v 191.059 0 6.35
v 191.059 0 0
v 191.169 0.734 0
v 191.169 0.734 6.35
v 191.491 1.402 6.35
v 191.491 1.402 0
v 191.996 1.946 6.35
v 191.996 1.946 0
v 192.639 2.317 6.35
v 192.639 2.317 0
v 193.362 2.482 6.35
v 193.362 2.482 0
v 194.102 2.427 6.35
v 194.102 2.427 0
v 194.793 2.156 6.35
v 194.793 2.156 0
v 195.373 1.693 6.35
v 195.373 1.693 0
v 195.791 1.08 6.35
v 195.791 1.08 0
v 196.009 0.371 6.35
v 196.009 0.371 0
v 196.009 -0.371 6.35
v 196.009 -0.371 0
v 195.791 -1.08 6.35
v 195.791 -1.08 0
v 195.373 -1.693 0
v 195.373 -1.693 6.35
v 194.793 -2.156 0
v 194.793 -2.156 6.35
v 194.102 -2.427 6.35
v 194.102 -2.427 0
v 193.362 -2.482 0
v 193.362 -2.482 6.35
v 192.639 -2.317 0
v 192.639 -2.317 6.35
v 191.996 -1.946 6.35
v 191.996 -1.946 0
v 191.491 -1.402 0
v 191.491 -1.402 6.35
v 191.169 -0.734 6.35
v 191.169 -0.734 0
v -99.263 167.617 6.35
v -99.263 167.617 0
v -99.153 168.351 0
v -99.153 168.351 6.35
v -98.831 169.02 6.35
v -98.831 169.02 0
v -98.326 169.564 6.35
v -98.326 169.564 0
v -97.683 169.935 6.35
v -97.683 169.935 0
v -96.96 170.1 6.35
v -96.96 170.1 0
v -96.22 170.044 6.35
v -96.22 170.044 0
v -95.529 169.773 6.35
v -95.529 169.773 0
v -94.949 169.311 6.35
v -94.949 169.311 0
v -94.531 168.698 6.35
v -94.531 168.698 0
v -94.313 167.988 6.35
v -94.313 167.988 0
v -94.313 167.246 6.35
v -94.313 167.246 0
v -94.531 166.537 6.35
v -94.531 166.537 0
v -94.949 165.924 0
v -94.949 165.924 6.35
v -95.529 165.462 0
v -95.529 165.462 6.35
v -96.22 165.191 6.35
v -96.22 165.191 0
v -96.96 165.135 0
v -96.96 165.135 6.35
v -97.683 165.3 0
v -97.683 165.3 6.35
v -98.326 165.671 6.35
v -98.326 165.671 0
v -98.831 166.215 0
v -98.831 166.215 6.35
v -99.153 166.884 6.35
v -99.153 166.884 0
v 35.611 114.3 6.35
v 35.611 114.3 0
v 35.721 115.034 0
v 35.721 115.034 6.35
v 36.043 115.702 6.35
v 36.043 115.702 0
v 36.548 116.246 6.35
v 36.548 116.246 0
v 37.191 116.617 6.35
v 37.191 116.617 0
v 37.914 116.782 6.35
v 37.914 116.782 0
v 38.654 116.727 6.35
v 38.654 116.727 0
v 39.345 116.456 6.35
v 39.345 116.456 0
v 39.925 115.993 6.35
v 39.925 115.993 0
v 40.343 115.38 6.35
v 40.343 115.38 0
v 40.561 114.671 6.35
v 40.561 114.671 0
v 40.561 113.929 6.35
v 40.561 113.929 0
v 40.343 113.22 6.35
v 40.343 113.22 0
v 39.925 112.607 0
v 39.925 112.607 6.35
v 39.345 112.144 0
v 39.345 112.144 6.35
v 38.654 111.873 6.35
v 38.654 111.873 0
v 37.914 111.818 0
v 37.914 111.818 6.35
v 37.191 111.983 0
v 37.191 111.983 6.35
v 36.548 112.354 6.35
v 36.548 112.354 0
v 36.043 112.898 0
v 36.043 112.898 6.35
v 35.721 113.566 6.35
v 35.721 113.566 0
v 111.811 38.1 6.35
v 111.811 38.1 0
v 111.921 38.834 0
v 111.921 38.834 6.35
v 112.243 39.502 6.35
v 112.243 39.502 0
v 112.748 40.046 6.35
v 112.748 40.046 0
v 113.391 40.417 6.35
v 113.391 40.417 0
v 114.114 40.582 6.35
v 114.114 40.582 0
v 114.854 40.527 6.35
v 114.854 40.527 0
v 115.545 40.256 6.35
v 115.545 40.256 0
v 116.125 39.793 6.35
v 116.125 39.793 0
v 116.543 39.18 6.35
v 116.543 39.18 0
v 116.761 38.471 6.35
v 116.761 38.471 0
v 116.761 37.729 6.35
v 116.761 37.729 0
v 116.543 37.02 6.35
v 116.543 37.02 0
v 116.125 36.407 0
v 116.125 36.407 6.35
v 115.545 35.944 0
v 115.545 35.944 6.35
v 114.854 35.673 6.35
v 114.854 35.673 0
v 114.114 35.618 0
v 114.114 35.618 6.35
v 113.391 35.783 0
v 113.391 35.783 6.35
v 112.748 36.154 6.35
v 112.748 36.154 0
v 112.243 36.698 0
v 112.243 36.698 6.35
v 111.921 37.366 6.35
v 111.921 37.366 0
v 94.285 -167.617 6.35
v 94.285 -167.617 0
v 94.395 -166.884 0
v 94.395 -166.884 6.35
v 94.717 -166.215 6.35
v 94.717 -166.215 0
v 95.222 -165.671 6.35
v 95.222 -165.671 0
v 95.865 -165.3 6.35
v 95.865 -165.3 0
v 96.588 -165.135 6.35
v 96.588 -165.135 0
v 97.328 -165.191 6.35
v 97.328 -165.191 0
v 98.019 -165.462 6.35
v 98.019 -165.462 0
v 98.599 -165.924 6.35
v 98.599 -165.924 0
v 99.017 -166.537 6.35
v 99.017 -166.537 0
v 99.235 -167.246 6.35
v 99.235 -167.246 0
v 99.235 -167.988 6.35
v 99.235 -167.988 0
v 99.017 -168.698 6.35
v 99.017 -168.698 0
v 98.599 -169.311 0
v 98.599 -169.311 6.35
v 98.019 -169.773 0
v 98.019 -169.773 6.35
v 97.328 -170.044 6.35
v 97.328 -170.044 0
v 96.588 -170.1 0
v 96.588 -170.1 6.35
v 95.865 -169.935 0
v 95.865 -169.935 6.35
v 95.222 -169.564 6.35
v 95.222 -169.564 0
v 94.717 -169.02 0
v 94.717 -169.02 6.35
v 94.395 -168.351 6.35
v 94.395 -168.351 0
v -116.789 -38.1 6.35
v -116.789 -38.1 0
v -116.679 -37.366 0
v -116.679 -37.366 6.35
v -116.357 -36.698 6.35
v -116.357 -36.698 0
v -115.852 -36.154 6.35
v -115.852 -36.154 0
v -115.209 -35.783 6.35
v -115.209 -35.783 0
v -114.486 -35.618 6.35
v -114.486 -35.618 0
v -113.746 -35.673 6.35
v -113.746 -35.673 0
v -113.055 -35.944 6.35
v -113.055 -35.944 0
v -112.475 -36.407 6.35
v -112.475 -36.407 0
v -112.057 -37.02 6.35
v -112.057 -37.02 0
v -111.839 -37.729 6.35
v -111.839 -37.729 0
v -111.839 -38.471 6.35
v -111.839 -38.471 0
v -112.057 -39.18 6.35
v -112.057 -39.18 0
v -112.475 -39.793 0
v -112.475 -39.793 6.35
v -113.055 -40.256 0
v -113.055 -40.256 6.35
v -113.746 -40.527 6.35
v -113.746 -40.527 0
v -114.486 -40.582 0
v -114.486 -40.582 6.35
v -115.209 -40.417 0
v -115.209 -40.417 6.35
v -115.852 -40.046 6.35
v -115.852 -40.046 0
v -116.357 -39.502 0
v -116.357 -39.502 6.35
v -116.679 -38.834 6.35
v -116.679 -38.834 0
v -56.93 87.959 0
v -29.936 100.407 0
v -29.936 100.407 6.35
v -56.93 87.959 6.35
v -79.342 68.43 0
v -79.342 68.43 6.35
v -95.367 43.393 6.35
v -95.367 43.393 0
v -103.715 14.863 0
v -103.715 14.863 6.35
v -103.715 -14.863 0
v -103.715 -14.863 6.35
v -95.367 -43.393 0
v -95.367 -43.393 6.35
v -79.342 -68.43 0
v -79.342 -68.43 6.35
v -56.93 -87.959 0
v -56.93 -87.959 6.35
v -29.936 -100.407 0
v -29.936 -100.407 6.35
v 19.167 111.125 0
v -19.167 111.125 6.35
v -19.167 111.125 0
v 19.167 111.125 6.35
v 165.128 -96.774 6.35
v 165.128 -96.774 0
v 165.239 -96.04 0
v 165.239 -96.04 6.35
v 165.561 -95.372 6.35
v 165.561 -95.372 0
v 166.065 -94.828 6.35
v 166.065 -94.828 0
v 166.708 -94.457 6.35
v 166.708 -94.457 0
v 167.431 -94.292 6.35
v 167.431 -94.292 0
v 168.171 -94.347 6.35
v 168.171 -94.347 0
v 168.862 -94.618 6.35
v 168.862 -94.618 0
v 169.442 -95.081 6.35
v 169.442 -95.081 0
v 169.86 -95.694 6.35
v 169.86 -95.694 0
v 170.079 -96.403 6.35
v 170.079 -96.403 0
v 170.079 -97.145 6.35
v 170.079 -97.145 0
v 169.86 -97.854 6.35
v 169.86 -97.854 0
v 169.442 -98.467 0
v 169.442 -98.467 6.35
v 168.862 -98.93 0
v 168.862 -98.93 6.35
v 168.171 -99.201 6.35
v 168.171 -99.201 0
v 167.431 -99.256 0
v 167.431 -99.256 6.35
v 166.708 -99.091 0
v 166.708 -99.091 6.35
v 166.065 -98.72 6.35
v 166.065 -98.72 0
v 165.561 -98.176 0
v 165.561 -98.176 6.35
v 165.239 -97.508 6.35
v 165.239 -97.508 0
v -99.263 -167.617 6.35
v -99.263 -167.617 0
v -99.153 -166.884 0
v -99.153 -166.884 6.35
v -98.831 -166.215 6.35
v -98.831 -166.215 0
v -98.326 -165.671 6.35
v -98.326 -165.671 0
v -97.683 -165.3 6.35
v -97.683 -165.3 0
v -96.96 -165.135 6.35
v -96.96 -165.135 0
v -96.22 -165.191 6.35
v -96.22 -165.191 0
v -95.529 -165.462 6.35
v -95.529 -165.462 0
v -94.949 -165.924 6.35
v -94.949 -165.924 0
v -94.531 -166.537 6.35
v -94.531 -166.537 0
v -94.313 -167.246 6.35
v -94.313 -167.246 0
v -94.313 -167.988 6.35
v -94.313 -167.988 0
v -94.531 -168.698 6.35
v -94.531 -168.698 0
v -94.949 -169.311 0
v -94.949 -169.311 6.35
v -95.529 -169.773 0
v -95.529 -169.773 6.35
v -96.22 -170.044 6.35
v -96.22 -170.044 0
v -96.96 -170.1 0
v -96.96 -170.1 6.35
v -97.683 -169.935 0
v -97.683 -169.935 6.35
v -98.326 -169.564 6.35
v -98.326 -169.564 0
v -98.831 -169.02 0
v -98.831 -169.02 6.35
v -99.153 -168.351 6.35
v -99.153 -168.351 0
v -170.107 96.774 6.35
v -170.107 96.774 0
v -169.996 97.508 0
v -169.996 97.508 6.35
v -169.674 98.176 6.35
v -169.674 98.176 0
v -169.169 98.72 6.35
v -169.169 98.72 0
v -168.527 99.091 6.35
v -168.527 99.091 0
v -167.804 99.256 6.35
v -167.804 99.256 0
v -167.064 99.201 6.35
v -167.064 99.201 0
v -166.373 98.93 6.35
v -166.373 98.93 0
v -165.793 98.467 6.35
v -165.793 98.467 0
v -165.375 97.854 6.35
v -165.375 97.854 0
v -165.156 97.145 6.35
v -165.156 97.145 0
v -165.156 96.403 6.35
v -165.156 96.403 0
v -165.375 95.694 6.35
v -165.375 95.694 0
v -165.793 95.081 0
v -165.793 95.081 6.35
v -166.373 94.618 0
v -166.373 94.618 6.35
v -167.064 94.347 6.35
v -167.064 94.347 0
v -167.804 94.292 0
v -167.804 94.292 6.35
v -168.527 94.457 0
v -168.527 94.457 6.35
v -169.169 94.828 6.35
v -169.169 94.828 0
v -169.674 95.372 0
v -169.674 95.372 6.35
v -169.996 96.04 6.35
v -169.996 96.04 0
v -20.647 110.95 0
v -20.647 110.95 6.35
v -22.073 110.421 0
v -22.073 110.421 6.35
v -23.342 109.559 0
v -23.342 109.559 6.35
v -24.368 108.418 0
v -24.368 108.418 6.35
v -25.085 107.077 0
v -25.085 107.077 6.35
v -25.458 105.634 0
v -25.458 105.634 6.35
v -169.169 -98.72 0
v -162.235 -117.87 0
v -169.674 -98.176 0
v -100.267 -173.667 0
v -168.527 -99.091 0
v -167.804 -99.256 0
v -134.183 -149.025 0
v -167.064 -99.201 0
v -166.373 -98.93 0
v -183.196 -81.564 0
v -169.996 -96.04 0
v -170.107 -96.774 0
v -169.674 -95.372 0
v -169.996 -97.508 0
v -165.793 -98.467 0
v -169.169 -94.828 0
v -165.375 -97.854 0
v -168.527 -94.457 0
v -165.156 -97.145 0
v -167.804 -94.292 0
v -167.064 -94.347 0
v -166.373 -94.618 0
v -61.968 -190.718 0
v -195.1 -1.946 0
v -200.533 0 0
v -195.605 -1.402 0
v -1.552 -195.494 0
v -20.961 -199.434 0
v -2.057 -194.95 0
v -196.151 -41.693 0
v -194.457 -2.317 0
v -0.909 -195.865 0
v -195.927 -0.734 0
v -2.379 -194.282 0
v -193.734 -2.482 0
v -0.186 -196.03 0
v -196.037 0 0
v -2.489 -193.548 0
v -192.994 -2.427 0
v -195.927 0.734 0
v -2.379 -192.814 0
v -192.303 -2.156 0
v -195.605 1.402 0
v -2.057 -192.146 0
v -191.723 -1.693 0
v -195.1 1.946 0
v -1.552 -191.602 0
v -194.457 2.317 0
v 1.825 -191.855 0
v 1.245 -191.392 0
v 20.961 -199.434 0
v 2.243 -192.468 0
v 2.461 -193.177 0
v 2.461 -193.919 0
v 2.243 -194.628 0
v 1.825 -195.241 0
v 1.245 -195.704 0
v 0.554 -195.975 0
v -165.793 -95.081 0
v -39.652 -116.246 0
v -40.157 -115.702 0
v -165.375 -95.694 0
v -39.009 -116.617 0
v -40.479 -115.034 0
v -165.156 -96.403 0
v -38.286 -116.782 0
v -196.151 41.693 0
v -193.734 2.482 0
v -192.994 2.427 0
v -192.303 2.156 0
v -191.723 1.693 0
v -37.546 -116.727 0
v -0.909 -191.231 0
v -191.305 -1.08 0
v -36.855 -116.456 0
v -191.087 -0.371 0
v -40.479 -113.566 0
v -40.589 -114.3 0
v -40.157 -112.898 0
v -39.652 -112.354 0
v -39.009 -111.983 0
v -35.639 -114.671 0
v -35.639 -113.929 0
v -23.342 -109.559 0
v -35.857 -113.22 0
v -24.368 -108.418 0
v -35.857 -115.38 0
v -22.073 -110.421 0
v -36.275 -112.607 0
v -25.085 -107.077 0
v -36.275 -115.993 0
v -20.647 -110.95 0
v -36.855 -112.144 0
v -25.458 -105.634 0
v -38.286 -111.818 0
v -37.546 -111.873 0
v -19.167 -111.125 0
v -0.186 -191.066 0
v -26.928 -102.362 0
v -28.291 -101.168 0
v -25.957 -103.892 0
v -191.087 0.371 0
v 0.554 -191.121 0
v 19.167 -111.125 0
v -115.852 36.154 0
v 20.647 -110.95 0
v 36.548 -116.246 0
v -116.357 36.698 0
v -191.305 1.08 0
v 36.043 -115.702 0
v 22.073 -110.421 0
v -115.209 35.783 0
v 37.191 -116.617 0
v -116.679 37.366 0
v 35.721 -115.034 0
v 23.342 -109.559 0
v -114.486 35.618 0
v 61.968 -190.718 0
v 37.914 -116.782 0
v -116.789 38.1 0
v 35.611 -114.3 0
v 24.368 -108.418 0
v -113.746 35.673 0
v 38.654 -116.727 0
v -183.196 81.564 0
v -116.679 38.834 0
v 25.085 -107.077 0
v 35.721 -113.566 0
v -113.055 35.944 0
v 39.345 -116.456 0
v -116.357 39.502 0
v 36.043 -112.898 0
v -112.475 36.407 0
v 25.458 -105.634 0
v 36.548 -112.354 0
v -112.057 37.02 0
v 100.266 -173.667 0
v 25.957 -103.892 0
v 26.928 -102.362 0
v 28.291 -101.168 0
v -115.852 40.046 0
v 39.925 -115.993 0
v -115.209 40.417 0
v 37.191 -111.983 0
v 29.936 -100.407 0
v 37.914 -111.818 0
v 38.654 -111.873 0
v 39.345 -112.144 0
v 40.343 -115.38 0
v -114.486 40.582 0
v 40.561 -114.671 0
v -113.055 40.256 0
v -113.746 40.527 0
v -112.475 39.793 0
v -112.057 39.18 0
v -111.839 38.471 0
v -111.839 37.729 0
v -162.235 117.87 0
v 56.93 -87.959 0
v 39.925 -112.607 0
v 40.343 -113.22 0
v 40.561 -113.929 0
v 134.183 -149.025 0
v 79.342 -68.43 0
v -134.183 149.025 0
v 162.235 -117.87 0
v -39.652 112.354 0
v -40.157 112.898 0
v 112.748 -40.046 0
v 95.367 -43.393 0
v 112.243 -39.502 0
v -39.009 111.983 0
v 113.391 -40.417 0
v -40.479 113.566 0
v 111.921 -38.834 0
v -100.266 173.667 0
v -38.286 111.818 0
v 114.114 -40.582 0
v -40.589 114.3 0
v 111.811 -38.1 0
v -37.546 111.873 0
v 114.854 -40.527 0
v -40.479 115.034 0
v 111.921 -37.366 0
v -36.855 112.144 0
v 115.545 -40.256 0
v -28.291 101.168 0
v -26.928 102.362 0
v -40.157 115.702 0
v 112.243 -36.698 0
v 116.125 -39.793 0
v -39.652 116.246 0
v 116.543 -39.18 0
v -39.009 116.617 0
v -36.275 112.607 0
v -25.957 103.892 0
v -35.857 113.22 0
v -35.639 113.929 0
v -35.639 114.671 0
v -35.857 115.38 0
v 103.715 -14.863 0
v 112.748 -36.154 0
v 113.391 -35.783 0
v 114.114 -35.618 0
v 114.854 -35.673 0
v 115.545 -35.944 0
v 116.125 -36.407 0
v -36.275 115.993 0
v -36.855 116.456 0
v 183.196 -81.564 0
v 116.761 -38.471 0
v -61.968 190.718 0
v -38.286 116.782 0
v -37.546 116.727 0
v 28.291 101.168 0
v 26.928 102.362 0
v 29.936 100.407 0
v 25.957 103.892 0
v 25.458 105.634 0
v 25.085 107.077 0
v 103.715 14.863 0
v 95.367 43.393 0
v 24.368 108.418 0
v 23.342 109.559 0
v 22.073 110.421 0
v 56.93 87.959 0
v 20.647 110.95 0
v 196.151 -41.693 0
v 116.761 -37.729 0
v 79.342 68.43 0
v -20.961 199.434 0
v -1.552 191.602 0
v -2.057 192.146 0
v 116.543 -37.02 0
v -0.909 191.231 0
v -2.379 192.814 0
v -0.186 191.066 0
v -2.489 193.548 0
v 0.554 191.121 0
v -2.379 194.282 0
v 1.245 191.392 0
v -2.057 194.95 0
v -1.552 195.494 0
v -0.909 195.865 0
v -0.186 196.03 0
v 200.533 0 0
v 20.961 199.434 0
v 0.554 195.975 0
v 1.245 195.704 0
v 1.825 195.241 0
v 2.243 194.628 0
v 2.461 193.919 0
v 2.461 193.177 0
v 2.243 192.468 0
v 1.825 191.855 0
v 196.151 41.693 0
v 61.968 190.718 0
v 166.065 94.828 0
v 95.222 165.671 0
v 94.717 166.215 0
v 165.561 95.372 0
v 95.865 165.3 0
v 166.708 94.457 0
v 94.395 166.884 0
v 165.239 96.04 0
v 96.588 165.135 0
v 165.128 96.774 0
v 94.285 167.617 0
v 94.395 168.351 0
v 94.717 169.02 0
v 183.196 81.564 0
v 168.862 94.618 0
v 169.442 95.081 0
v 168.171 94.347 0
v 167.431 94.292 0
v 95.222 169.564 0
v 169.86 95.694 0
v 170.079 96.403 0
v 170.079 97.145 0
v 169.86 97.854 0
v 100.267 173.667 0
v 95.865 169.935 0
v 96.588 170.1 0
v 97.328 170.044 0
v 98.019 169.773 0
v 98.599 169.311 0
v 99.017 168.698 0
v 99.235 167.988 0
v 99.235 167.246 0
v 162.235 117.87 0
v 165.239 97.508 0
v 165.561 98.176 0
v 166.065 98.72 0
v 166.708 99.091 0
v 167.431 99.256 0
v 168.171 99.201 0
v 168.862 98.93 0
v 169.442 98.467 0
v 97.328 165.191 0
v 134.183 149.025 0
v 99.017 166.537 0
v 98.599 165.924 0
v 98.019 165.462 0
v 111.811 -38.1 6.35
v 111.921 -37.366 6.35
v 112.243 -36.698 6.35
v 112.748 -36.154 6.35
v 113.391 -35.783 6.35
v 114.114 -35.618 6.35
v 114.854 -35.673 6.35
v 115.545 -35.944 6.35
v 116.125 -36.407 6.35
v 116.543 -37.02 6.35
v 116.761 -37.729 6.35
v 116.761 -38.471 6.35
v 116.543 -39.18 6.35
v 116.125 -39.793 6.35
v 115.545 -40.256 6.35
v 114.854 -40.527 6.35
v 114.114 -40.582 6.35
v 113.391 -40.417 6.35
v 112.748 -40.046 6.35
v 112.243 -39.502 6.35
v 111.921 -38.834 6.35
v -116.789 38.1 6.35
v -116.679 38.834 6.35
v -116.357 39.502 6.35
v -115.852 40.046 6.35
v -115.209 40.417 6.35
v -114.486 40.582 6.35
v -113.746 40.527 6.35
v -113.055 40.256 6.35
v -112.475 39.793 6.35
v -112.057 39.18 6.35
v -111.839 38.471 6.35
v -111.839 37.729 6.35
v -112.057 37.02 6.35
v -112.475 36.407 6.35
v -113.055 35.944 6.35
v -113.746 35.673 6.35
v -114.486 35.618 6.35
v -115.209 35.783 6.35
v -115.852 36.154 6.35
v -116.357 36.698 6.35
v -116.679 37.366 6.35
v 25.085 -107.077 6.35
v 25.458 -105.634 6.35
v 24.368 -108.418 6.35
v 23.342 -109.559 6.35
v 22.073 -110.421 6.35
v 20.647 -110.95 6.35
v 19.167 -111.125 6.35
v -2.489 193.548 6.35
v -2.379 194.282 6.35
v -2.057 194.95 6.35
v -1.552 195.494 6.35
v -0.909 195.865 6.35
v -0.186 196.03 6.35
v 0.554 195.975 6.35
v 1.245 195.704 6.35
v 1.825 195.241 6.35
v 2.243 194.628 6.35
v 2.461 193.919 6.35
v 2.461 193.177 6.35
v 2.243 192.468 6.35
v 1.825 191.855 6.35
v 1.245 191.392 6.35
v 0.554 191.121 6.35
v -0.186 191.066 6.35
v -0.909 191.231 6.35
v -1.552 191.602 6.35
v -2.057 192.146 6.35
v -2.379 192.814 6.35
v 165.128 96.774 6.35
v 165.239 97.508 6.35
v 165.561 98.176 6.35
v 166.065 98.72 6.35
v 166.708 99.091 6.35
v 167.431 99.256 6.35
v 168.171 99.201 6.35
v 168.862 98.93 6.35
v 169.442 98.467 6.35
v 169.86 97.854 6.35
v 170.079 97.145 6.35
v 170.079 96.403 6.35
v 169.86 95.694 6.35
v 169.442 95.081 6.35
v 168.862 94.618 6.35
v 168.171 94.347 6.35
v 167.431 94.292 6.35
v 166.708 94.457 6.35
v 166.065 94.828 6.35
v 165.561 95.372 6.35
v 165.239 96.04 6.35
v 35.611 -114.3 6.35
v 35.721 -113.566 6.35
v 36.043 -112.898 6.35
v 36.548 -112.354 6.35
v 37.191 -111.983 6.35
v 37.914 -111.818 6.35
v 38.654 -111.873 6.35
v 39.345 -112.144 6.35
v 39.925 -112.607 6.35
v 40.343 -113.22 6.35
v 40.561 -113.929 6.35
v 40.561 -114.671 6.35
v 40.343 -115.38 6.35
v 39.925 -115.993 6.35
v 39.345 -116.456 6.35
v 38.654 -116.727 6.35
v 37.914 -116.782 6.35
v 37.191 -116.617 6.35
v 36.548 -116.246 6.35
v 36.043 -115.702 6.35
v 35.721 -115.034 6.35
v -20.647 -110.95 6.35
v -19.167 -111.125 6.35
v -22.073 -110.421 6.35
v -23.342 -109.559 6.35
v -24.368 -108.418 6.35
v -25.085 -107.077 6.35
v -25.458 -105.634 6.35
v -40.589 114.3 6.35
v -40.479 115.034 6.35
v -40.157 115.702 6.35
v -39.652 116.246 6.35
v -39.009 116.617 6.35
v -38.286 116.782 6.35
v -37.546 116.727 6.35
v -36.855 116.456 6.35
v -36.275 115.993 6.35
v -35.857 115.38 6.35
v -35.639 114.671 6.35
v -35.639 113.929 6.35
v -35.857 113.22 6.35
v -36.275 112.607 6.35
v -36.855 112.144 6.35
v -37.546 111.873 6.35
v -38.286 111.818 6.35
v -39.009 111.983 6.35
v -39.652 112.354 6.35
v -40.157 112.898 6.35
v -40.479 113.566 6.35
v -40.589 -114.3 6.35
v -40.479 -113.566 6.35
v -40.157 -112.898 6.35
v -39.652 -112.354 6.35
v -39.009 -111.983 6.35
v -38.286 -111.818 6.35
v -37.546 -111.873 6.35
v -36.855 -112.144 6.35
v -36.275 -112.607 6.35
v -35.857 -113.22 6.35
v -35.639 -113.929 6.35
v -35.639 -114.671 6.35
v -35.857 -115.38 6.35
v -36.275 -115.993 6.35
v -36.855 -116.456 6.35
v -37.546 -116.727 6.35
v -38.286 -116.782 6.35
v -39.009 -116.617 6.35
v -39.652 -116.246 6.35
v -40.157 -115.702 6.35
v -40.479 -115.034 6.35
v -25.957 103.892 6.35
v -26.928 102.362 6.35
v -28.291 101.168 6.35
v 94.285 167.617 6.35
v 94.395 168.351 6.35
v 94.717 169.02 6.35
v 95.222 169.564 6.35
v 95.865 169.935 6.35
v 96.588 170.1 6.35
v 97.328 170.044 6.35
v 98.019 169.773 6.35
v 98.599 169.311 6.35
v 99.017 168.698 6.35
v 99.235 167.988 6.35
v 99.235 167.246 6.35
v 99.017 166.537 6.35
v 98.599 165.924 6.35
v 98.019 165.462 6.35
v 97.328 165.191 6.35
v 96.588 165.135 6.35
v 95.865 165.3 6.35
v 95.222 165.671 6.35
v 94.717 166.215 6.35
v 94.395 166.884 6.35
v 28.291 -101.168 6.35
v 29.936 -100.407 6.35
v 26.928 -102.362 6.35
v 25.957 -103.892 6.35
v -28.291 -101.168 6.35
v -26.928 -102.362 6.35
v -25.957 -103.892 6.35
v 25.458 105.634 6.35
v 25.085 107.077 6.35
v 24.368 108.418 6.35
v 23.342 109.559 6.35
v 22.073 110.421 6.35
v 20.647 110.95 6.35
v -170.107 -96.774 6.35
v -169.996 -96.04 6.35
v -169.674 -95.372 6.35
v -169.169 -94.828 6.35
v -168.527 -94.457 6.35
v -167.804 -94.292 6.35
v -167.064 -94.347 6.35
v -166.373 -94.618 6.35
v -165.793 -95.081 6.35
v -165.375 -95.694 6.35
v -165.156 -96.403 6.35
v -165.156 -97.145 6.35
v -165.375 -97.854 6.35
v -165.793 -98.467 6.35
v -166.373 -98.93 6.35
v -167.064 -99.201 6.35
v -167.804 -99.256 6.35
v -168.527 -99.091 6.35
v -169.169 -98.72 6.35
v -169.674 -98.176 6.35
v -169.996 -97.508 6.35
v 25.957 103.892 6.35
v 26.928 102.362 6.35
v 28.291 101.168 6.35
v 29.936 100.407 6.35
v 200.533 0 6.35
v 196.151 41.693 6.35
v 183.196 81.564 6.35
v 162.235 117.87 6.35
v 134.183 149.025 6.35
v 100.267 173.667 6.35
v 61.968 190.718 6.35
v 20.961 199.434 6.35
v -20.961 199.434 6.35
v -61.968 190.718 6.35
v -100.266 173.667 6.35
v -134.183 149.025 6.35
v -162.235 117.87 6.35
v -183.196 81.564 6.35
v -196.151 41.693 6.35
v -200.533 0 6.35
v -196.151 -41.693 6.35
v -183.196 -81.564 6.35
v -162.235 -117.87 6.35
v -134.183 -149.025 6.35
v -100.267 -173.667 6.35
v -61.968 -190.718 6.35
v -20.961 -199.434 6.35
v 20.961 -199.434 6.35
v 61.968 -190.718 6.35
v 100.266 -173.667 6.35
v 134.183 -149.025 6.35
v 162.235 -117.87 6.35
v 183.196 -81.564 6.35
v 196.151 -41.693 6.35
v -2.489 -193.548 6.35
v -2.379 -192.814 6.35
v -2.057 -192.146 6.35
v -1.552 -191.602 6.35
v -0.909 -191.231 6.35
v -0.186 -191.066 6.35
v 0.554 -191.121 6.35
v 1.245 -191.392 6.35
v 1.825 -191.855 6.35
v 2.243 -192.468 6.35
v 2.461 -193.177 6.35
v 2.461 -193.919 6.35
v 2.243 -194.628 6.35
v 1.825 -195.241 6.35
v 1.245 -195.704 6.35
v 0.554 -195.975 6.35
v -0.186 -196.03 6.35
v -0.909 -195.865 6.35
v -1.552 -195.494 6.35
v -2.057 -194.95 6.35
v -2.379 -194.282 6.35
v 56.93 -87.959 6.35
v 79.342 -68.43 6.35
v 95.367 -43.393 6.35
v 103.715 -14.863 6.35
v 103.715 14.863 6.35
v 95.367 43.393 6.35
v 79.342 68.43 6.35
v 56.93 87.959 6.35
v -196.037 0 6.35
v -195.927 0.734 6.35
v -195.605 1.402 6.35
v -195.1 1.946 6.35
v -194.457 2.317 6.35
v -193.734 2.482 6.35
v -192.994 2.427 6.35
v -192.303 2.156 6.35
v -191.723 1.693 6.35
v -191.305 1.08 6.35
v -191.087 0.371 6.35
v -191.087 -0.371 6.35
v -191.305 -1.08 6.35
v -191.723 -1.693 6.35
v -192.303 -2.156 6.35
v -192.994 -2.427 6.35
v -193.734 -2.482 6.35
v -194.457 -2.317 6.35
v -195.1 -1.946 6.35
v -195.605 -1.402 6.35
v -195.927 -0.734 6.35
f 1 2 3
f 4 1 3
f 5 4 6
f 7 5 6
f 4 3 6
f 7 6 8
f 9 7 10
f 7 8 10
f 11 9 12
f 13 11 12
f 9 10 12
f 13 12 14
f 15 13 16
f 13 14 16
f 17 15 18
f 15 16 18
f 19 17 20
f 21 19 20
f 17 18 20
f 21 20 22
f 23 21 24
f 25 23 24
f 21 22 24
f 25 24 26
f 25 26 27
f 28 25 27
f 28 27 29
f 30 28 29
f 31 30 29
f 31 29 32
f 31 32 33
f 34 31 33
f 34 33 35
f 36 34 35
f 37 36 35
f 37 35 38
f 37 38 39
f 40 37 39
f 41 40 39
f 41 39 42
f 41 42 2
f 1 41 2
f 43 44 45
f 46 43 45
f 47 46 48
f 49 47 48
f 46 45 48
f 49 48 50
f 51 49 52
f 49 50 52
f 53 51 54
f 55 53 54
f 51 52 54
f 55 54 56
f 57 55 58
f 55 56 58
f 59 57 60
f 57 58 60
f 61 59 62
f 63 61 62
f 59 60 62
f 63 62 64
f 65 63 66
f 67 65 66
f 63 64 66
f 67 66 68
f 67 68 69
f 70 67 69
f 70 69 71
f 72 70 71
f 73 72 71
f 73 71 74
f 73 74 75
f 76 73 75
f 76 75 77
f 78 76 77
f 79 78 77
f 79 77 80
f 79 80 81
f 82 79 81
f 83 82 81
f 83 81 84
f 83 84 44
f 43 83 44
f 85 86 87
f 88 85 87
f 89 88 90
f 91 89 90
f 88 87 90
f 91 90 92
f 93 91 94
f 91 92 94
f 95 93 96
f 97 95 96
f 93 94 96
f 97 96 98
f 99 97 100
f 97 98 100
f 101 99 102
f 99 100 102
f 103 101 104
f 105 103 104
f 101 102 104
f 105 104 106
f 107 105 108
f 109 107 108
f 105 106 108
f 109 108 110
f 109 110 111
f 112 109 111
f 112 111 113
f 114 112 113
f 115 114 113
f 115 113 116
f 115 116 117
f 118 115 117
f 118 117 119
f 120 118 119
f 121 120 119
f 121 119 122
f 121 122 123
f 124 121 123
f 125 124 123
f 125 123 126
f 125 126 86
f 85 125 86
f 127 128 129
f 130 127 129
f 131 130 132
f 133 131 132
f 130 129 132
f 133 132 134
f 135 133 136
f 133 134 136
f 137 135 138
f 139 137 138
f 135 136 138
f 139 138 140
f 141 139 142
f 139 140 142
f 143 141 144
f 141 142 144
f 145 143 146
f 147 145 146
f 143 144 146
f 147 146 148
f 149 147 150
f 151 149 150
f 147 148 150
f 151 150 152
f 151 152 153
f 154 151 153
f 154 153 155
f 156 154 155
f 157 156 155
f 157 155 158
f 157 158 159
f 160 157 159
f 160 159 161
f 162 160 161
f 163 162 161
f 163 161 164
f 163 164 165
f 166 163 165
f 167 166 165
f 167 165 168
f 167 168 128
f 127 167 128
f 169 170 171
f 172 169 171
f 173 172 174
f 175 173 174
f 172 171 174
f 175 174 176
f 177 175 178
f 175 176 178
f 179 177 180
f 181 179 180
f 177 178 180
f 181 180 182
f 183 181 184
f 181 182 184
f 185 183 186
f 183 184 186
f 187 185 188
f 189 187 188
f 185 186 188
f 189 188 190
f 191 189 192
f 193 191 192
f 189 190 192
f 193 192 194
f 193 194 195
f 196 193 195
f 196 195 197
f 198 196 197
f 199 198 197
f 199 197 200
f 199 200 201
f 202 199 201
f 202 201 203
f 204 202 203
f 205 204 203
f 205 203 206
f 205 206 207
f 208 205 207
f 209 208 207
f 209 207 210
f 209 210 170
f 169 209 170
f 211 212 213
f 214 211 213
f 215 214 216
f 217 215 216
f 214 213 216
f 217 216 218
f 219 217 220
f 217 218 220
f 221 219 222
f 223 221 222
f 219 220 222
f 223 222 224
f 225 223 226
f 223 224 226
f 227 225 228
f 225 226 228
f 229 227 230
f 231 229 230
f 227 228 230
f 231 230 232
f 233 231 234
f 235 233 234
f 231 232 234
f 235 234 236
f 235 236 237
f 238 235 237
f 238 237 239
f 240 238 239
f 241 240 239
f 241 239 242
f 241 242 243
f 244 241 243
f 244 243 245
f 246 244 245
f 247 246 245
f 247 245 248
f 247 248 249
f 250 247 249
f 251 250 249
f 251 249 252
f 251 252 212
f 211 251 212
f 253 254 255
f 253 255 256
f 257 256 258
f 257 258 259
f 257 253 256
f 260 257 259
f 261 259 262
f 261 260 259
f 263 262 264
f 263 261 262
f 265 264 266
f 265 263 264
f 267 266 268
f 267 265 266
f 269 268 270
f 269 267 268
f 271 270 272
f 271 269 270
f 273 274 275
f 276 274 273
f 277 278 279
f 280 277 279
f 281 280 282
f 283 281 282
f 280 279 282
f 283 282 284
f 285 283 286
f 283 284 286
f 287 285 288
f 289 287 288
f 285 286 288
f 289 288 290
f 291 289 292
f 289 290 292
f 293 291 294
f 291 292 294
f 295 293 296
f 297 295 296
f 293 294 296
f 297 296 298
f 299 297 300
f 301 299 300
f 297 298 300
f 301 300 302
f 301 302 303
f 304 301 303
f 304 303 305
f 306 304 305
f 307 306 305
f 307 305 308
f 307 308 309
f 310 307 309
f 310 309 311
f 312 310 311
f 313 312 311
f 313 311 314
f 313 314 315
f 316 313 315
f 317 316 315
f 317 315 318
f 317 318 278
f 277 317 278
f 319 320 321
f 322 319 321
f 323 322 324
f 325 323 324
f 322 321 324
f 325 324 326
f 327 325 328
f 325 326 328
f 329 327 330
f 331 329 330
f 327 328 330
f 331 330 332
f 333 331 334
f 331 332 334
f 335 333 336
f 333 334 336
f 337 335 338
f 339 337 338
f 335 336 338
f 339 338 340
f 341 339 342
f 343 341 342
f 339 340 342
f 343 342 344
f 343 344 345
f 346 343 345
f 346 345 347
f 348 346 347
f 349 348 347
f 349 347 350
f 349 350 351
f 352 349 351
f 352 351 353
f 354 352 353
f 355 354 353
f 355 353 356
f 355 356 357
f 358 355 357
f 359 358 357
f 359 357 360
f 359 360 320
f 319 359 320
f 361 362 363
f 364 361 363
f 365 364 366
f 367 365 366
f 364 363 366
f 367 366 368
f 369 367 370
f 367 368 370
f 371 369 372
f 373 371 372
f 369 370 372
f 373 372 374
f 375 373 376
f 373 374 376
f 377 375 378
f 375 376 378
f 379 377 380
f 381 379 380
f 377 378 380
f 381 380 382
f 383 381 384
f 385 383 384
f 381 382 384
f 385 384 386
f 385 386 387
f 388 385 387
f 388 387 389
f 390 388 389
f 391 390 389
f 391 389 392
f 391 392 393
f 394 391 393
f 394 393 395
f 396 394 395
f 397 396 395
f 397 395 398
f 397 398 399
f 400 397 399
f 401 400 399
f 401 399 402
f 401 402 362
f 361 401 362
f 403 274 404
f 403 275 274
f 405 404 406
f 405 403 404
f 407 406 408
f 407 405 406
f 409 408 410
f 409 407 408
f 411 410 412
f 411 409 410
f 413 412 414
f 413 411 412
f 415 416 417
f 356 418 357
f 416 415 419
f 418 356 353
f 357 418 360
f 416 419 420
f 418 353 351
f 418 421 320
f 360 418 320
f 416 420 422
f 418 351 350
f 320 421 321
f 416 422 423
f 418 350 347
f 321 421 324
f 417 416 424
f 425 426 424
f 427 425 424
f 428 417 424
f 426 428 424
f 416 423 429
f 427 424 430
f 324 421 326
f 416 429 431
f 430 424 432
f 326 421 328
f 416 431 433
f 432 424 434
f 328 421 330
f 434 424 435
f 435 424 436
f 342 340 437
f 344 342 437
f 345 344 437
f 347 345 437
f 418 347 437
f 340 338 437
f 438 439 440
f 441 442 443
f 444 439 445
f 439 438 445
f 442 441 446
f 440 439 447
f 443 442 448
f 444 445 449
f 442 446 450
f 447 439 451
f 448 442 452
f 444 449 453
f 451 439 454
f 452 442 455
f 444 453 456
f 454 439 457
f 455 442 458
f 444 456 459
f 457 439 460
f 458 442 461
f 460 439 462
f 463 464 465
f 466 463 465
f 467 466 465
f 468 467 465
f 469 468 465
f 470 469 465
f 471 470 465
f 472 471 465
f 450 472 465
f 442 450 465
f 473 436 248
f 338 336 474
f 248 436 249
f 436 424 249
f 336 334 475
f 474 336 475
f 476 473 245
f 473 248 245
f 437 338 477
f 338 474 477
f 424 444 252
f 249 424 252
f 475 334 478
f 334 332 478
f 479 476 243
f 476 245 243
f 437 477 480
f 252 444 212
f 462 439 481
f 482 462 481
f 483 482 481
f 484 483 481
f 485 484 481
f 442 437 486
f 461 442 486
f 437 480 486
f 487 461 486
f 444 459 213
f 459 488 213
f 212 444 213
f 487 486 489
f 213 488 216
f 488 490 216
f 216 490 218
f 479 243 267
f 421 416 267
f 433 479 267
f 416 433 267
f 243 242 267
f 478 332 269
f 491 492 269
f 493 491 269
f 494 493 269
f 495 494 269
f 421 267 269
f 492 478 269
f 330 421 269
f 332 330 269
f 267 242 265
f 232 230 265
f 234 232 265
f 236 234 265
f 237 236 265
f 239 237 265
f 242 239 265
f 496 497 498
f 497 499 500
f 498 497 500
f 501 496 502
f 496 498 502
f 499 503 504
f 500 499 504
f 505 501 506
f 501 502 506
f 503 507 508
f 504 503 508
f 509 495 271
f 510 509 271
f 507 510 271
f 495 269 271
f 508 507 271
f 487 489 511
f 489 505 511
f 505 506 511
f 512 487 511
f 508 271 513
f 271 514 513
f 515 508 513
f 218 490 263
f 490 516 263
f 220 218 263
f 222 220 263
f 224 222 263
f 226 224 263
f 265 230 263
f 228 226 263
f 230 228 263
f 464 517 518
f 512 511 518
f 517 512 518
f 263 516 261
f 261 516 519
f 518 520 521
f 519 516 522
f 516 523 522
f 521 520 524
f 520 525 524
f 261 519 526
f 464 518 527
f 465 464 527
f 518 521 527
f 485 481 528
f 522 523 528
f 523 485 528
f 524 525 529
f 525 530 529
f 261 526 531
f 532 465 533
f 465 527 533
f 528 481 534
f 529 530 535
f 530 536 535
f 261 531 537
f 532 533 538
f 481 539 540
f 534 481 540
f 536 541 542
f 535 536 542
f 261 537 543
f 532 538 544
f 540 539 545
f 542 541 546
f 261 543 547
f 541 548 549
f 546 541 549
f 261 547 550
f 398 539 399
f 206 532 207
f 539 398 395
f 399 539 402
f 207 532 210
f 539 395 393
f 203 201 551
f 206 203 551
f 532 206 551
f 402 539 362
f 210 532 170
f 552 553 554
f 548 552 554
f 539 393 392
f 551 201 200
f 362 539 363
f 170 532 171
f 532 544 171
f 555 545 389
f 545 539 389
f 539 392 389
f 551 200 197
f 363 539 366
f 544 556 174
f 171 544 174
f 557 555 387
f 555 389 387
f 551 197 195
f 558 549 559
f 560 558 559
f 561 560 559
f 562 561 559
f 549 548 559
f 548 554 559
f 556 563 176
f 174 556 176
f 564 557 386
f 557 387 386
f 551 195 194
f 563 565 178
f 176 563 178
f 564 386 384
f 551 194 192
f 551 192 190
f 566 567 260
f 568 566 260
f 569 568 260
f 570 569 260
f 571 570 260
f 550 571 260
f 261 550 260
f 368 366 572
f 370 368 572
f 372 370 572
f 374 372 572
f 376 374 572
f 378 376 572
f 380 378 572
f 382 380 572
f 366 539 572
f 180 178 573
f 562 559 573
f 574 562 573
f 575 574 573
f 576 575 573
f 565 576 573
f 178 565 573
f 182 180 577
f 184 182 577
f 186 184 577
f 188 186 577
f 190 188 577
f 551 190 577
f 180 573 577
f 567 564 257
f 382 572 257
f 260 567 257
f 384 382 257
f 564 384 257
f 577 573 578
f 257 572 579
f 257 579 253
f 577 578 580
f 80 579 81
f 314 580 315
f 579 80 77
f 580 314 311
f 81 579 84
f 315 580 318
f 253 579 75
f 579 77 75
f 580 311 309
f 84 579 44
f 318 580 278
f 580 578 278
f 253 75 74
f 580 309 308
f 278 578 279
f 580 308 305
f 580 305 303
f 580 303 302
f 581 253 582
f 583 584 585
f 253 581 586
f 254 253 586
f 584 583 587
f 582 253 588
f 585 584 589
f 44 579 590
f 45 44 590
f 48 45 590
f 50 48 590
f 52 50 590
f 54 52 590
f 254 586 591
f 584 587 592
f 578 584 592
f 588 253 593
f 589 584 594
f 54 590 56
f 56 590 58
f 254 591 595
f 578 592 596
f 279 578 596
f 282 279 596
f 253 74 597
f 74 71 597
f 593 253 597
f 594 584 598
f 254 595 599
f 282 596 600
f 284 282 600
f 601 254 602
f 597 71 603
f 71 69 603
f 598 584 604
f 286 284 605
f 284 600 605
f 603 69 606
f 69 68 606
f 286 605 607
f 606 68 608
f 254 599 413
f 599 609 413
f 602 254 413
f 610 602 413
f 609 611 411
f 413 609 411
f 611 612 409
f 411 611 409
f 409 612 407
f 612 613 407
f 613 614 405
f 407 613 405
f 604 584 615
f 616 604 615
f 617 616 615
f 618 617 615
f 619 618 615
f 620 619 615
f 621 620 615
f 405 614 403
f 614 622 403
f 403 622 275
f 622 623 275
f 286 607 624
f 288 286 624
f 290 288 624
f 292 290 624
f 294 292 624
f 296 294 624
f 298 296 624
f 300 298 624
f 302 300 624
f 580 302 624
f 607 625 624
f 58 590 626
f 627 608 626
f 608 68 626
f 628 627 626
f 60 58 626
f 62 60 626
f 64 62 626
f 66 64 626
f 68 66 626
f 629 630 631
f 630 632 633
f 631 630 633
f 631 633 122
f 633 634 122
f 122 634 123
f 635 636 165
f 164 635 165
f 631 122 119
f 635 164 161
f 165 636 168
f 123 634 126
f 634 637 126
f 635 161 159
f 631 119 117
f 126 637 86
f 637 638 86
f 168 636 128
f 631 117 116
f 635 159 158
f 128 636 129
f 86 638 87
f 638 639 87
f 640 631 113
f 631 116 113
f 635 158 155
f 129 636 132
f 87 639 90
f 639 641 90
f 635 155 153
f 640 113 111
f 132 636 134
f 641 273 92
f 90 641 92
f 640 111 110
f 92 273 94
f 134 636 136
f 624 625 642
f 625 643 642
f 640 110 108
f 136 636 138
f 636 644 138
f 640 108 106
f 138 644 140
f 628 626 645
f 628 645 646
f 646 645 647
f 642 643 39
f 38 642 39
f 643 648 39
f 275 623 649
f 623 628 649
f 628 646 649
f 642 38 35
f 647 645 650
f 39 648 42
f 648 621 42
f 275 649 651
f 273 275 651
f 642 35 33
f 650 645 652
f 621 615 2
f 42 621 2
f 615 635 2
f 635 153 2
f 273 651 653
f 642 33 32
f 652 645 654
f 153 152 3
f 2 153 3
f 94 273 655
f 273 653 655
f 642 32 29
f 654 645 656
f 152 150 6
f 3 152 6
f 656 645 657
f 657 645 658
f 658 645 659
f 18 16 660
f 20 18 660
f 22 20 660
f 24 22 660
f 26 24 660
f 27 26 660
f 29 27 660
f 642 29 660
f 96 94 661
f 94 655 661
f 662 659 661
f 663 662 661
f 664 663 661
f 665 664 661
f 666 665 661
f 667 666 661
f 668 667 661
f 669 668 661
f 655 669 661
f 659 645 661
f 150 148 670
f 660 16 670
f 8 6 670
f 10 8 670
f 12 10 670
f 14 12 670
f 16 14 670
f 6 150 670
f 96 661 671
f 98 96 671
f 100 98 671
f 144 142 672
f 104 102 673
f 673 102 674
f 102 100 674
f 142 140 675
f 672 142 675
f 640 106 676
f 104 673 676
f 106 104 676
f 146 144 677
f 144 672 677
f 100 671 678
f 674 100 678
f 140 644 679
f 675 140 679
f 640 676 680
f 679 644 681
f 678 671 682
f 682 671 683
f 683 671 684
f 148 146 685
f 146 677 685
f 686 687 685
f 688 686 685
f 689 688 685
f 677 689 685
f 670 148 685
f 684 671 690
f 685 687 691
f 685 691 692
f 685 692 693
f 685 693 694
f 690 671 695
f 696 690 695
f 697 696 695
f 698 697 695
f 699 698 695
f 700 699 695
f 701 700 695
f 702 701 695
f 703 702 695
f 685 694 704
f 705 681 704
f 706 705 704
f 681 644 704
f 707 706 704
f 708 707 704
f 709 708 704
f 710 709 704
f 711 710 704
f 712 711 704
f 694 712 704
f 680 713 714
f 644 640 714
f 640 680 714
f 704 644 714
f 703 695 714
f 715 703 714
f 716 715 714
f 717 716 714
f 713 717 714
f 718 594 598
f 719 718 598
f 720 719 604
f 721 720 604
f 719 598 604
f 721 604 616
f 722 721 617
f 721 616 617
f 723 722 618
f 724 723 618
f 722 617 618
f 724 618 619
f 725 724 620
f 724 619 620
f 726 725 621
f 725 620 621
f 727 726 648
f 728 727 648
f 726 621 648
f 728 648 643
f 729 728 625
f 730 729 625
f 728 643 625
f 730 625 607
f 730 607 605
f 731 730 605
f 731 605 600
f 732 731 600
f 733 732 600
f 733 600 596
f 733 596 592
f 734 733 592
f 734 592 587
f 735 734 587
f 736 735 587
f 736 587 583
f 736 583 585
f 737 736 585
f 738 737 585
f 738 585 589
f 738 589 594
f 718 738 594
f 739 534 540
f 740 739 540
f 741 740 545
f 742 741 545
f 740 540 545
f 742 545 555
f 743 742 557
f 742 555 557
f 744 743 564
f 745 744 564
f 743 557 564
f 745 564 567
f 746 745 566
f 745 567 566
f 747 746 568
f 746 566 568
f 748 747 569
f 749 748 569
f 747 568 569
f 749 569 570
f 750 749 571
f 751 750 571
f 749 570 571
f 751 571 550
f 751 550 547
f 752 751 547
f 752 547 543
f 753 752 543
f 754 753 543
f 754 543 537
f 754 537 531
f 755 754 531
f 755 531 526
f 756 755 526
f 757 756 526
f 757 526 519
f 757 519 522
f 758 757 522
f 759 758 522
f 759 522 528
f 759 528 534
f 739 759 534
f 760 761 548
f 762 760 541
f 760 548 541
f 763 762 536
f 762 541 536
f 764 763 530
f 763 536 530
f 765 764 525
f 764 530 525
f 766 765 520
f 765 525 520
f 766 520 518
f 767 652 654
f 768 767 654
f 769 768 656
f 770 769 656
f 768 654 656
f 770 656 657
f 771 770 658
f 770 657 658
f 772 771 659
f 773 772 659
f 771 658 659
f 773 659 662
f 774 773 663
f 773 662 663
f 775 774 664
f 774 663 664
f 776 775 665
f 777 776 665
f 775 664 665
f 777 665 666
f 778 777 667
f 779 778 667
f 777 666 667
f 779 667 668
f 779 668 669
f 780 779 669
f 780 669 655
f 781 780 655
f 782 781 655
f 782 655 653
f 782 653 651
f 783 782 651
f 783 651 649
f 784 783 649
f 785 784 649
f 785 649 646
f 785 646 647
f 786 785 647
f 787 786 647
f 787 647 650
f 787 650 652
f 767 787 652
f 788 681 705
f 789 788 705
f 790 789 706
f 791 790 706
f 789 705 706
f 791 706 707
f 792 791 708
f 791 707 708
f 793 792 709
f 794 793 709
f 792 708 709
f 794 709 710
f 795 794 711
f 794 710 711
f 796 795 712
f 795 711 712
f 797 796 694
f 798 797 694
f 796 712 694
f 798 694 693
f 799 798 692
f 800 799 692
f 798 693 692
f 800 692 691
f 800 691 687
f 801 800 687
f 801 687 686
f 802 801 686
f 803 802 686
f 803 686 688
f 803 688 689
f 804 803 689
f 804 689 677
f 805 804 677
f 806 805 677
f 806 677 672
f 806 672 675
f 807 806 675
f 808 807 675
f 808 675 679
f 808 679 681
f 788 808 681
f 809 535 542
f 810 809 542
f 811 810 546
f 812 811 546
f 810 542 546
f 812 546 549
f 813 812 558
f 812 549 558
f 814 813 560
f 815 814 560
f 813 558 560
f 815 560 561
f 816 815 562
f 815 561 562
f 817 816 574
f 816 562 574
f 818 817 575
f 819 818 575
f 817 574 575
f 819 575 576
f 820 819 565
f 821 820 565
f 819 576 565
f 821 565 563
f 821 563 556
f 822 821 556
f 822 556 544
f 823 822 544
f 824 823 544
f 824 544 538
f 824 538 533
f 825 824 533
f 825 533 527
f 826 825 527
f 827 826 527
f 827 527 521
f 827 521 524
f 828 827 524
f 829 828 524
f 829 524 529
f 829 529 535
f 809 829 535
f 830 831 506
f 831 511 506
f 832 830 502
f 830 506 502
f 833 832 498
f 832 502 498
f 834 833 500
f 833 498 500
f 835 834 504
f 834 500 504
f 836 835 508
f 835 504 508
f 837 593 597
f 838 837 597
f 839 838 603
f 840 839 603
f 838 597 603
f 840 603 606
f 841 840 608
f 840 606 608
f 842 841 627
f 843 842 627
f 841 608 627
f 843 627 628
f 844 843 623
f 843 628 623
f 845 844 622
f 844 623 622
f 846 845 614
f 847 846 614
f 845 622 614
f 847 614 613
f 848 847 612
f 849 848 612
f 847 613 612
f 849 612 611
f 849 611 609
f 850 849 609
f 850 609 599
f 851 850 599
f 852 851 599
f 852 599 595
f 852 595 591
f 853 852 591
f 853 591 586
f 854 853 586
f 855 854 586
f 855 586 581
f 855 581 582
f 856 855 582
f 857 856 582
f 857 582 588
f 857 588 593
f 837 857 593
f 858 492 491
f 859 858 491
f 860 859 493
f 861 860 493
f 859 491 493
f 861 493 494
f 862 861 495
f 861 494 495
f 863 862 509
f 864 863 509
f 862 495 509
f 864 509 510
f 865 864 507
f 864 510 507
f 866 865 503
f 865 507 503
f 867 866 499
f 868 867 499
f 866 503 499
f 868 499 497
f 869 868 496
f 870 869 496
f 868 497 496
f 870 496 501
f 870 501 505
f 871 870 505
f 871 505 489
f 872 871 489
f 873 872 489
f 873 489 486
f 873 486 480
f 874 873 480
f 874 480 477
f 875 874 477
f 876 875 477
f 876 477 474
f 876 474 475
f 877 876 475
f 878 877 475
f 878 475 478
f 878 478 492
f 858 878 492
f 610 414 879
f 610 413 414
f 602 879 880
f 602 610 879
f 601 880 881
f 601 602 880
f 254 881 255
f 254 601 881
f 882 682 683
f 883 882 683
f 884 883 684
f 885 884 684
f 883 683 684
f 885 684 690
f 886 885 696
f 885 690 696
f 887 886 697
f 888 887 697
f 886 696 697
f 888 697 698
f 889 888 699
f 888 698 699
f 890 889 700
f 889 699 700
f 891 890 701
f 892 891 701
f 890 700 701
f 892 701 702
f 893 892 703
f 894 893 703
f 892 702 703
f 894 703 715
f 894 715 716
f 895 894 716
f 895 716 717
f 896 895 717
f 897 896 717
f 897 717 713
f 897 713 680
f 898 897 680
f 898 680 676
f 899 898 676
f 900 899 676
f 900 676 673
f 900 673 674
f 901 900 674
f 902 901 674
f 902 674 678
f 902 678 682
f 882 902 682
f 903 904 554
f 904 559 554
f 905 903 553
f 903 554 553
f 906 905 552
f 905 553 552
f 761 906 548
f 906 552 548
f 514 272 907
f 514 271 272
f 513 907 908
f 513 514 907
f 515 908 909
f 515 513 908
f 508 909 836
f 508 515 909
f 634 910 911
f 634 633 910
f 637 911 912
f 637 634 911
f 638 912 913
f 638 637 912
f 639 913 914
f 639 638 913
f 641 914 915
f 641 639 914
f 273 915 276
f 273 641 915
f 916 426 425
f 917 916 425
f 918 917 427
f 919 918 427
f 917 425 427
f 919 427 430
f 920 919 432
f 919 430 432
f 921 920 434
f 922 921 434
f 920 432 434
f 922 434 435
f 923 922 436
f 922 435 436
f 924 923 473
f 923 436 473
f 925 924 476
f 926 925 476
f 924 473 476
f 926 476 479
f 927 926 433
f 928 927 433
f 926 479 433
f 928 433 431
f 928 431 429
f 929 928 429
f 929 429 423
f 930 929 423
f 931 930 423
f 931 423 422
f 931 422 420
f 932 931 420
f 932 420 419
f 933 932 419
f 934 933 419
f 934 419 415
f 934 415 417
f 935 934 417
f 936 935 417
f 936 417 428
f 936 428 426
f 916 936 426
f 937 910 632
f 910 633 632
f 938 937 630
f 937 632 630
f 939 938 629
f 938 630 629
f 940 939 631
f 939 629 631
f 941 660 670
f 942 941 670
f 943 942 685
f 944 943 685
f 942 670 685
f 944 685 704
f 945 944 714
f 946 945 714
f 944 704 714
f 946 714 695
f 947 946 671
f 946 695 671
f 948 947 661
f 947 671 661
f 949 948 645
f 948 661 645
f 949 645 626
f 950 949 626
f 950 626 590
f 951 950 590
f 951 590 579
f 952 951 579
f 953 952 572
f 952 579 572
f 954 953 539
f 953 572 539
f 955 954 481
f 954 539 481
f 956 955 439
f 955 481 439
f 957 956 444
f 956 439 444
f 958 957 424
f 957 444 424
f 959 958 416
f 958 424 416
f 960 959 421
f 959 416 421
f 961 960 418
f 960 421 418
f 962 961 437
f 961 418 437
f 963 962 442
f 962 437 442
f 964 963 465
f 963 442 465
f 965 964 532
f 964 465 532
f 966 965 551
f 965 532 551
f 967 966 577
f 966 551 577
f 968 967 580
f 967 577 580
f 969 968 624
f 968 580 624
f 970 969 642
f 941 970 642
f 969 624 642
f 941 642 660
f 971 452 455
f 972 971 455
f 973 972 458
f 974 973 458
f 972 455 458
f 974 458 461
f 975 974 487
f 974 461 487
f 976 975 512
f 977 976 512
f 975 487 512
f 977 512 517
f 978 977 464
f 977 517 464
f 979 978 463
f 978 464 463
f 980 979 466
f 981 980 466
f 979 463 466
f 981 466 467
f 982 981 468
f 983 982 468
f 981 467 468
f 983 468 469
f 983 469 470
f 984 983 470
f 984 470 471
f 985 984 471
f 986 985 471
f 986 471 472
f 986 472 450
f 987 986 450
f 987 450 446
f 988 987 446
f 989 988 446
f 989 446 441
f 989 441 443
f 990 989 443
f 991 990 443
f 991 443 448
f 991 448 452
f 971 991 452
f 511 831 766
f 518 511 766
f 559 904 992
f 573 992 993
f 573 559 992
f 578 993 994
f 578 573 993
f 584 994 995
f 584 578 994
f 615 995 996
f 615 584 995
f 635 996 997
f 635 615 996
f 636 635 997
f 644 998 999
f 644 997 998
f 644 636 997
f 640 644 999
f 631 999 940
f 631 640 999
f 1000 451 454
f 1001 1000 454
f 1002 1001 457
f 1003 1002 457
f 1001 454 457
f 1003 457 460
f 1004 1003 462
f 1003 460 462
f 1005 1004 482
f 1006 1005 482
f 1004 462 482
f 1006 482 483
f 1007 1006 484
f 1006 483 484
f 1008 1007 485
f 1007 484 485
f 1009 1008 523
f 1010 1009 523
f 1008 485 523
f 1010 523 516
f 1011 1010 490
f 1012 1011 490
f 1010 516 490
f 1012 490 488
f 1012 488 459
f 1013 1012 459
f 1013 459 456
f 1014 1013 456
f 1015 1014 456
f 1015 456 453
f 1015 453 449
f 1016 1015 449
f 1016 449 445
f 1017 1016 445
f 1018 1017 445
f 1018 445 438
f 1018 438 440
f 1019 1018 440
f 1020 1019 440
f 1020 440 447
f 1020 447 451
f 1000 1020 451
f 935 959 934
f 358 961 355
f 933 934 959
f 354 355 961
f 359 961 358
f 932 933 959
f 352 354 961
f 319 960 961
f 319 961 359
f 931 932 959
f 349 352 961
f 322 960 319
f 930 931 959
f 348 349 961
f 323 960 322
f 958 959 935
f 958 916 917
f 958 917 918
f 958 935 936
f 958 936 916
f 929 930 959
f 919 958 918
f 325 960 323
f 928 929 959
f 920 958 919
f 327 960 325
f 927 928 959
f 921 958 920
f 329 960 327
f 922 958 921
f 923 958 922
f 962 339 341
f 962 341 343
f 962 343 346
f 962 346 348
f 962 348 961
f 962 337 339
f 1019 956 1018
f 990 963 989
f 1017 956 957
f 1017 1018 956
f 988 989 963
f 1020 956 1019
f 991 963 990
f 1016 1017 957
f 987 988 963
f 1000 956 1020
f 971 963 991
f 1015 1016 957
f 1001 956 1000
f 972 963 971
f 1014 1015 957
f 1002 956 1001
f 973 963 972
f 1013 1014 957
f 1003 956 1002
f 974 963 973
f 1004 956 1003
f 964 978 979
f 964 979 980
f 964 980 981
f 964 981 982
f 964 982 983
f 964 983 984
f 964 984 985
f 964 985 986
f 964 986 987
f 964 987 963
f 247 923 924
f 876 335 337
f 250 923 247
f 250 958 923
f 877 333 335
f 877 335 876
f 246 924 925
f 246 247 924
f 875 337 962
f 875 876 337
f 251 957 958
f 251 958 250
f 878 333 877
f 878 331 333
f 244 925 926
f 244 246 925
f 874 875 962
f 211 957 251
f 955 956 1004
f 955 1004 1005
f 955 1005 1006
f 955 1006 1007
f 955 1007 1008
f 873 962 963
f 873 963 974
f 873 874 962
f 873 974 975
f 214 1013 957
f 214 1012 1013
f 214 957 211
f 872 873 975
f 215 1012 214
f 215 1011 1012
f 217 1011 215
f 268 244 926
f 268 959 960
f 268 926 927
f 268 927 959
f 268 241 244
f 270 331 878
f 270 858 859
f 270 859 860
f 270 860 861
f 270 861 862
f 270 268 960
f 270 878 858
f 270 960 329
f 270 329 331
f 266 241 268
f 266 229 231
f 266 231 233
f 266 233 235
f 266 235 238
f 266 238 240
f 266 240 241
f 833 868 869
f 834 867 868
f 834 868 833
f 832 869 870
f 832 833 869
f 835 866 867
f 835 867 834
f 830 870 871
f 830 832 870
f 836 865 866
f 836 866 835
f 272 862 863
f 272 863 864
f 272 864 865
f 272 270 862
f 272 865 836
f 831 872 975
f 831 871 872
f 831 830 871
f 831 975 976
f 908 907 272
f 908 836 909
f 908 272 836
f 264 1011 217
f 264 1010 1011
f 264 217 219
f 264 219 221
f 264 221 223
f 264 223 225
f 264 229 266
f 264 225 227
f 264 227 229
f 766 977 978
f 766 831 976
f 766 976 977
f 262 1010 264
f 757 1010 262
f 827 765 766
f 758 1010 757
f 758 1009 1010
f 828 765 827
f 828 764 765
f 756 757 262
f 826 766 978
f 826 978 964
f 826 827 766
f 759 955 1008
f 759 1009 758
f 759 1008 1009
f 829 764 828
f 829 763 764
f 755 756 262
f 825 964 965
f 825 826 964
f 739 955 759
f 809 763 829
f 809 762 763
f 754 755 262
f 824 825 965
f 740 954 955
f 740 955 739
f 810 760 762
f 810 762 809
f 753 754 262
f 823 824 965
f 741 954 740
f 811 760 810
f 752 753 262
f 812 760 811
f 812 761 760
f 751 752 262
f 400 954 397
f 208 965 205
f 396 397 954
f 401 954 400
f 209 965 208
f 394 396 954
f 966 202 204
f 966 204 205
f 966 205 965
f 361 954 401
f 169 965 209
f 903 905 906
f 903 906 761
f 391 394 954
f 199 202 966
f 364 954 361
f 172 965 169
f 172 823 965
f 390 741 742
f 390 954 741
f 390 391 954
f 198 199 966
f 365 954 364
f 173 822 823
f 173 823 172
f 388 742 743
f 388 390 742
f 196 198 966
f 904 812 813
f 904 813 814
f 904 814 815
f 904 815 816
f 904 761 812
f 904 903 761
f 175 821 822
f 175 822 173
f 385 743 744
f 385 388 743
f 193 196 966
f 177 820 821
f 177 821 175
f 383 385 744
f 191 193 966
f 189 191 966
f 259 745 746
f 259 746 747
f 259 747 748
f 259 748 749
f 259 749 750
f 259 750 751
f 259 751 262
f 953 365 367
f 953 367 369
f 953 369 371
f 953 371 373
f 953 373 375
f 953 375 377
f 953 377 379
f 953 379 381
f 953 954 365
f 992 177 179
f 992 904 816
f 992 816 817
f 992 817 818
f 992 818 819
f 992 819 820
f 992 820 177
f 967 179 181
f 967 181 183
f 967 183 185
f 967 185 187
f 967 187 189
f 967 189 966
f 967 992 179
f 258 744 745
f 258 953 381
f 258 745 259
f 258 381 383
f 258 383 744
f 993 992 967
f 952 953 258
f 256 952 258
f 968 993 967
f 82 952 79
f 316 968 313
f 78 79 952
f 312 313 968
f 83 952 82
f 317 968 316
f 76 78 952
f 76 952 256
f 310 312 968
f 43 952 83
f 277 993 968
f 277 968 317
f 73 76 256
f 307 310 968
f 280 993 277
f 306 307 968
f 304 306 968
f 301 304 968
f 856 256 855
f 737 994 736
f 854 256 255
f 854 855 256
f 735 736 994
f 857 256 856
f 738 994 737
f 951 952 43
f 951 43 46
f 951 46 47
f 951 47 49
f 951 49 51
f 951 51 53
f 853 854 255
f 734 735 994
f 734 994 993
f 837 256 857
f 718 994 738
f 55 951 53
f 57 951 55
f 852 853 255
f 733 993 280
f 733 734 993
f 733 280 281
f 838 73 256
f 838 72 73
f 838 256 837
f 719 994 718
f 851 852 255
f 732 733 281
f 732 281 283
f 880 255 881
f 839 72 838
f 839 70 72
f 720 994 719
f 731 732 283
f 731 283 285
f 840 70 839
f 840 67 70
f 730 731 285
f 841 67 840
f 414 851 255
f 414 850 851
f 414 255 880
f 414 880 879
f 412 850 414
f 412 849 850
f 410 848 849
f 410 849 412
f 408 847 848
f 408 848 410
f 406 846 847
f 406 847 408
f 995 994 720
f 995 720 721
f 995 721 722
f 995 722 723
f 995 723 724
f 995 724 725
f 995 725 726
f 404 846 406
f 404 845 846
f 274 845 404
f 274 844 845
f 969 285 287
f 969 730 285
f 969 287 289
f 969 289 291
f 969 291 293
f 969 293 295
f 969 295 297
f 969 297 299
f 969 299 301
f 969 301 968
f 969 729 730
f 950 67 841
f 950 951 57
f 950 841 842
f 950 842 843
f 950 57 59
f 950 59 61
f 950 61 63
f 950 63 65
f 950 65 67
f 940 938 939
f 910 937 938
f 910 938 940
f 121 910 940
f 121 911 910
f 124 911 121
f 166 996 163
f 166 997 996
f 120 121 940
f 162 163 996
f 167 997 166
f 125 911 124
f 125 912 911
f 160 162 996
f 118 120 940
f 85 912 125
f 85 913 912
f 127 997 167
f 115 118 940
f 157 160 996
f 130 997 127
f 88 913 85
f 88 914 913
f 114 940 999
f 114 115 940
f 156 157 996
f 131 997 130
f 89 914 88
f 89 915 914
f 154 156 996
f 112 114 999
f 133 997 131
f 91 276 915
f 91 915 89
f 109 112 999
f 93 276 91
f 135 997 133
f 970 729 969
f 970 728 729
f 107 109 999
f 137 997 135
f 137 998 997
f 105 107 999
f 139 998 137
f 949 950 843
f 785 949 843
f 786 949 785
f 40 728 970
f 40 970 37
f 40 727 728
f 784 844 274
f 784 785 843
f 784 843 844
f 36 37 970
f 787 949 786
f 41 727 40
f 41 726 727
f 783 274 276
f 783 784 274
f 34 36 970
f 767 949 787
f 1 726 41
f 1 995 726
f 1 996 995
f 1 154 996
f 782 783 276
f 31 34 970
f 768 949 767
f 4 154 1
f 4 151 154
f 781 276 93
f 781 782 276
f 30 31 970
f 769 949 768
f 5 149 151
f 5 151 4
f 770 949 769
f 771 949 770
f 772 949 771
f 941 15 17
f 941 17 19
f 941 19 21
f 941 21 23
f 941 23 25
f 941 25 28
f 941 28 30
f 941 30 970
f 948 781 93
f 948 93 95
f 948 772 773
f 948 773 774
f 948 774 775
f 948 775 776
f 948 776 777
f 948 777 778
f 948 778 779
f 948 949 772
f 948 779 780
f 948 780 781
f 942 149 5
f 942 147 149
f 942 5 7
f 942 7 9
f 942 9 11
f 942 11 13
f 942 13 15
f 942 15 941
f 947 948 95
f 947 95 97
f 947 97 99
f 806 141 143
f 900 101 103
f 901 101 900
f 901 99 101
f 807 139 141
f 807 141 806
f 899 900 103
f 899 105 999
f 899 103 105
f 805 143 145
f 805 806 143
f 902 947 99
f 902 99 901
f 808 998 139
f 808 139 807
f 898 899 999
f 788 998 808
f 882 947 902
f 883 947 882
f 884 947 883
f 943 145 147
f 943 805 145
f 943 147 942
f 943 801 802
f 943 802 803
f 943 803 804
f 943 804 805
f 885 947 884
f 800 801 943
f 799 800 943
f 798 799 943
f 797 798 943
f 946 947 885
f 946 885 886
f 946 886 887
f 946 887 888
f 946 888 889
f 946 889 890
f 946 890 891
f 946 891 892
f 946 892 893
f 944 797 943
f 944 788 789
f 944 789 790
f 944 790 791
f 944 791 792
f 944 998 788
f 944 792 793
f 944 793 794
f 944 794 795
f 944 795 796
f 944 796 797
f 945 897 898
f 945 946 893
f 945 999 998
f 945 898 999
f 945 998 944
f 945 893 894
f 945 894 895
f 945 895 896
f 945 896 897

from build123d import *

# Parameters (mm, degrees)
SKETCH1_R                  = 200.533
SKETCH1_R_2                = 104.775
BOSS_EXTRUDE1_DEPTH        = 6.35
F_9_0_196_DIAMETER_HOLE1_D = 4.9784
SKETCH4_W                  = 50.8
SKETCH4_H                  = 9.525
CUT_EXTRUDE1_DEPTH         = 284.66757072
F_9_0_196_DIAMETER_HOLE2_D = 4.9784
FILLET1_R                  = 6.35
FILLET2_R                  = 6.35


with BuildPart() as part:
    # Sketch1 → Boss-Extrude1 (new body)
    with BuildSketch(Plane(origin=(0, 0, 0), x_dir=(0, 1, 0), z_dir=(0, 0, 1))):
        with Locations(Location((0, 0, 0), (0, 0, 270))):
            Circle(SKETCH1_R)
        with Locations(Location((0, 0, 0), (0, 0, 270))):
            Circle(SKETCH1_R_2, mode=Mode.SUBTRACT)
    extrude(amount=BOSS_EXTRUDE1_DEPTH)

    # #9 (0.196) Diameter Hole1 (through all)
    with Locations(Plane.XY.offset(6.35)):
        with Locations((-96.774, 167.617484852), (-167.617484852, 96.774), (-193.548, 0), (-167.617484852, -96.774), (-96.774, -167.617484852), (0, -193.548), (96.774, -167.617484852), (167.617484852, -96.774), (193.548, 0), (167.617484852, 96.774), (96.774, 167.617484852), (0, 193.548)):
            Hole(F_9_0_196_DIAMETER_HOLE1_D / 2)

    # Sketch4 → Cut-Extrude1 (cut, through all)
    with BuildSketch(Plane.XY.offset(6.35)):
        with Locations((0, 106.3625)):
            Rectangle(SKETCH4_W, SKETCH4_H)
        with Locations((0, -106.3625)):
            Rectangle(SKETCH4_W, SKETCH4_H)
    extrude(amount=-CUT_EXTRUDE1_DEPTH, mode=Mode.SUBTRACT)

    # #9 (0.196) Diameter Hole2 (through all)
    with Locations(Plane.XY.offset(6.35)):
        with Locations((-114.3, 38.1), (-114.3, -38.1), (-38.1, -114.3), (38.1, -114.3), (114.3, -38.1), (114.3, 38.1), (38.1, 114.3), (-38.1, 114.3)):
            Hole(F_9_0_196_DIAMETER_HOLE2_D / 2)

    # Fillet1
    fillet1_edges = [part.edges().sort_by_distance(p)[0] for p in [
        (25.4, -101.649597269, 3.175),
        (-25.4, -101.649597269, 3.175),
        (-25.4, 101.649597269, 3.175),
        (25.4, 101.649597269, 3.175),
    ]]
    fillet(fillet1_edges, radius=FILLET1_R)

    # Fillet2
    fillet2_edges = [part.edges().sort_by_distance(p)[0] for p in [
        (25.4, -111.125, 3.175),
        (-25.4, -111.125, 3.175),
        (25.4, 111.125, 3.175),
        (-25.4, 111.125, 3.175),
    ]]
    fillet(fillet2_edges, radius=FILLET2_R)


solid = part.part
